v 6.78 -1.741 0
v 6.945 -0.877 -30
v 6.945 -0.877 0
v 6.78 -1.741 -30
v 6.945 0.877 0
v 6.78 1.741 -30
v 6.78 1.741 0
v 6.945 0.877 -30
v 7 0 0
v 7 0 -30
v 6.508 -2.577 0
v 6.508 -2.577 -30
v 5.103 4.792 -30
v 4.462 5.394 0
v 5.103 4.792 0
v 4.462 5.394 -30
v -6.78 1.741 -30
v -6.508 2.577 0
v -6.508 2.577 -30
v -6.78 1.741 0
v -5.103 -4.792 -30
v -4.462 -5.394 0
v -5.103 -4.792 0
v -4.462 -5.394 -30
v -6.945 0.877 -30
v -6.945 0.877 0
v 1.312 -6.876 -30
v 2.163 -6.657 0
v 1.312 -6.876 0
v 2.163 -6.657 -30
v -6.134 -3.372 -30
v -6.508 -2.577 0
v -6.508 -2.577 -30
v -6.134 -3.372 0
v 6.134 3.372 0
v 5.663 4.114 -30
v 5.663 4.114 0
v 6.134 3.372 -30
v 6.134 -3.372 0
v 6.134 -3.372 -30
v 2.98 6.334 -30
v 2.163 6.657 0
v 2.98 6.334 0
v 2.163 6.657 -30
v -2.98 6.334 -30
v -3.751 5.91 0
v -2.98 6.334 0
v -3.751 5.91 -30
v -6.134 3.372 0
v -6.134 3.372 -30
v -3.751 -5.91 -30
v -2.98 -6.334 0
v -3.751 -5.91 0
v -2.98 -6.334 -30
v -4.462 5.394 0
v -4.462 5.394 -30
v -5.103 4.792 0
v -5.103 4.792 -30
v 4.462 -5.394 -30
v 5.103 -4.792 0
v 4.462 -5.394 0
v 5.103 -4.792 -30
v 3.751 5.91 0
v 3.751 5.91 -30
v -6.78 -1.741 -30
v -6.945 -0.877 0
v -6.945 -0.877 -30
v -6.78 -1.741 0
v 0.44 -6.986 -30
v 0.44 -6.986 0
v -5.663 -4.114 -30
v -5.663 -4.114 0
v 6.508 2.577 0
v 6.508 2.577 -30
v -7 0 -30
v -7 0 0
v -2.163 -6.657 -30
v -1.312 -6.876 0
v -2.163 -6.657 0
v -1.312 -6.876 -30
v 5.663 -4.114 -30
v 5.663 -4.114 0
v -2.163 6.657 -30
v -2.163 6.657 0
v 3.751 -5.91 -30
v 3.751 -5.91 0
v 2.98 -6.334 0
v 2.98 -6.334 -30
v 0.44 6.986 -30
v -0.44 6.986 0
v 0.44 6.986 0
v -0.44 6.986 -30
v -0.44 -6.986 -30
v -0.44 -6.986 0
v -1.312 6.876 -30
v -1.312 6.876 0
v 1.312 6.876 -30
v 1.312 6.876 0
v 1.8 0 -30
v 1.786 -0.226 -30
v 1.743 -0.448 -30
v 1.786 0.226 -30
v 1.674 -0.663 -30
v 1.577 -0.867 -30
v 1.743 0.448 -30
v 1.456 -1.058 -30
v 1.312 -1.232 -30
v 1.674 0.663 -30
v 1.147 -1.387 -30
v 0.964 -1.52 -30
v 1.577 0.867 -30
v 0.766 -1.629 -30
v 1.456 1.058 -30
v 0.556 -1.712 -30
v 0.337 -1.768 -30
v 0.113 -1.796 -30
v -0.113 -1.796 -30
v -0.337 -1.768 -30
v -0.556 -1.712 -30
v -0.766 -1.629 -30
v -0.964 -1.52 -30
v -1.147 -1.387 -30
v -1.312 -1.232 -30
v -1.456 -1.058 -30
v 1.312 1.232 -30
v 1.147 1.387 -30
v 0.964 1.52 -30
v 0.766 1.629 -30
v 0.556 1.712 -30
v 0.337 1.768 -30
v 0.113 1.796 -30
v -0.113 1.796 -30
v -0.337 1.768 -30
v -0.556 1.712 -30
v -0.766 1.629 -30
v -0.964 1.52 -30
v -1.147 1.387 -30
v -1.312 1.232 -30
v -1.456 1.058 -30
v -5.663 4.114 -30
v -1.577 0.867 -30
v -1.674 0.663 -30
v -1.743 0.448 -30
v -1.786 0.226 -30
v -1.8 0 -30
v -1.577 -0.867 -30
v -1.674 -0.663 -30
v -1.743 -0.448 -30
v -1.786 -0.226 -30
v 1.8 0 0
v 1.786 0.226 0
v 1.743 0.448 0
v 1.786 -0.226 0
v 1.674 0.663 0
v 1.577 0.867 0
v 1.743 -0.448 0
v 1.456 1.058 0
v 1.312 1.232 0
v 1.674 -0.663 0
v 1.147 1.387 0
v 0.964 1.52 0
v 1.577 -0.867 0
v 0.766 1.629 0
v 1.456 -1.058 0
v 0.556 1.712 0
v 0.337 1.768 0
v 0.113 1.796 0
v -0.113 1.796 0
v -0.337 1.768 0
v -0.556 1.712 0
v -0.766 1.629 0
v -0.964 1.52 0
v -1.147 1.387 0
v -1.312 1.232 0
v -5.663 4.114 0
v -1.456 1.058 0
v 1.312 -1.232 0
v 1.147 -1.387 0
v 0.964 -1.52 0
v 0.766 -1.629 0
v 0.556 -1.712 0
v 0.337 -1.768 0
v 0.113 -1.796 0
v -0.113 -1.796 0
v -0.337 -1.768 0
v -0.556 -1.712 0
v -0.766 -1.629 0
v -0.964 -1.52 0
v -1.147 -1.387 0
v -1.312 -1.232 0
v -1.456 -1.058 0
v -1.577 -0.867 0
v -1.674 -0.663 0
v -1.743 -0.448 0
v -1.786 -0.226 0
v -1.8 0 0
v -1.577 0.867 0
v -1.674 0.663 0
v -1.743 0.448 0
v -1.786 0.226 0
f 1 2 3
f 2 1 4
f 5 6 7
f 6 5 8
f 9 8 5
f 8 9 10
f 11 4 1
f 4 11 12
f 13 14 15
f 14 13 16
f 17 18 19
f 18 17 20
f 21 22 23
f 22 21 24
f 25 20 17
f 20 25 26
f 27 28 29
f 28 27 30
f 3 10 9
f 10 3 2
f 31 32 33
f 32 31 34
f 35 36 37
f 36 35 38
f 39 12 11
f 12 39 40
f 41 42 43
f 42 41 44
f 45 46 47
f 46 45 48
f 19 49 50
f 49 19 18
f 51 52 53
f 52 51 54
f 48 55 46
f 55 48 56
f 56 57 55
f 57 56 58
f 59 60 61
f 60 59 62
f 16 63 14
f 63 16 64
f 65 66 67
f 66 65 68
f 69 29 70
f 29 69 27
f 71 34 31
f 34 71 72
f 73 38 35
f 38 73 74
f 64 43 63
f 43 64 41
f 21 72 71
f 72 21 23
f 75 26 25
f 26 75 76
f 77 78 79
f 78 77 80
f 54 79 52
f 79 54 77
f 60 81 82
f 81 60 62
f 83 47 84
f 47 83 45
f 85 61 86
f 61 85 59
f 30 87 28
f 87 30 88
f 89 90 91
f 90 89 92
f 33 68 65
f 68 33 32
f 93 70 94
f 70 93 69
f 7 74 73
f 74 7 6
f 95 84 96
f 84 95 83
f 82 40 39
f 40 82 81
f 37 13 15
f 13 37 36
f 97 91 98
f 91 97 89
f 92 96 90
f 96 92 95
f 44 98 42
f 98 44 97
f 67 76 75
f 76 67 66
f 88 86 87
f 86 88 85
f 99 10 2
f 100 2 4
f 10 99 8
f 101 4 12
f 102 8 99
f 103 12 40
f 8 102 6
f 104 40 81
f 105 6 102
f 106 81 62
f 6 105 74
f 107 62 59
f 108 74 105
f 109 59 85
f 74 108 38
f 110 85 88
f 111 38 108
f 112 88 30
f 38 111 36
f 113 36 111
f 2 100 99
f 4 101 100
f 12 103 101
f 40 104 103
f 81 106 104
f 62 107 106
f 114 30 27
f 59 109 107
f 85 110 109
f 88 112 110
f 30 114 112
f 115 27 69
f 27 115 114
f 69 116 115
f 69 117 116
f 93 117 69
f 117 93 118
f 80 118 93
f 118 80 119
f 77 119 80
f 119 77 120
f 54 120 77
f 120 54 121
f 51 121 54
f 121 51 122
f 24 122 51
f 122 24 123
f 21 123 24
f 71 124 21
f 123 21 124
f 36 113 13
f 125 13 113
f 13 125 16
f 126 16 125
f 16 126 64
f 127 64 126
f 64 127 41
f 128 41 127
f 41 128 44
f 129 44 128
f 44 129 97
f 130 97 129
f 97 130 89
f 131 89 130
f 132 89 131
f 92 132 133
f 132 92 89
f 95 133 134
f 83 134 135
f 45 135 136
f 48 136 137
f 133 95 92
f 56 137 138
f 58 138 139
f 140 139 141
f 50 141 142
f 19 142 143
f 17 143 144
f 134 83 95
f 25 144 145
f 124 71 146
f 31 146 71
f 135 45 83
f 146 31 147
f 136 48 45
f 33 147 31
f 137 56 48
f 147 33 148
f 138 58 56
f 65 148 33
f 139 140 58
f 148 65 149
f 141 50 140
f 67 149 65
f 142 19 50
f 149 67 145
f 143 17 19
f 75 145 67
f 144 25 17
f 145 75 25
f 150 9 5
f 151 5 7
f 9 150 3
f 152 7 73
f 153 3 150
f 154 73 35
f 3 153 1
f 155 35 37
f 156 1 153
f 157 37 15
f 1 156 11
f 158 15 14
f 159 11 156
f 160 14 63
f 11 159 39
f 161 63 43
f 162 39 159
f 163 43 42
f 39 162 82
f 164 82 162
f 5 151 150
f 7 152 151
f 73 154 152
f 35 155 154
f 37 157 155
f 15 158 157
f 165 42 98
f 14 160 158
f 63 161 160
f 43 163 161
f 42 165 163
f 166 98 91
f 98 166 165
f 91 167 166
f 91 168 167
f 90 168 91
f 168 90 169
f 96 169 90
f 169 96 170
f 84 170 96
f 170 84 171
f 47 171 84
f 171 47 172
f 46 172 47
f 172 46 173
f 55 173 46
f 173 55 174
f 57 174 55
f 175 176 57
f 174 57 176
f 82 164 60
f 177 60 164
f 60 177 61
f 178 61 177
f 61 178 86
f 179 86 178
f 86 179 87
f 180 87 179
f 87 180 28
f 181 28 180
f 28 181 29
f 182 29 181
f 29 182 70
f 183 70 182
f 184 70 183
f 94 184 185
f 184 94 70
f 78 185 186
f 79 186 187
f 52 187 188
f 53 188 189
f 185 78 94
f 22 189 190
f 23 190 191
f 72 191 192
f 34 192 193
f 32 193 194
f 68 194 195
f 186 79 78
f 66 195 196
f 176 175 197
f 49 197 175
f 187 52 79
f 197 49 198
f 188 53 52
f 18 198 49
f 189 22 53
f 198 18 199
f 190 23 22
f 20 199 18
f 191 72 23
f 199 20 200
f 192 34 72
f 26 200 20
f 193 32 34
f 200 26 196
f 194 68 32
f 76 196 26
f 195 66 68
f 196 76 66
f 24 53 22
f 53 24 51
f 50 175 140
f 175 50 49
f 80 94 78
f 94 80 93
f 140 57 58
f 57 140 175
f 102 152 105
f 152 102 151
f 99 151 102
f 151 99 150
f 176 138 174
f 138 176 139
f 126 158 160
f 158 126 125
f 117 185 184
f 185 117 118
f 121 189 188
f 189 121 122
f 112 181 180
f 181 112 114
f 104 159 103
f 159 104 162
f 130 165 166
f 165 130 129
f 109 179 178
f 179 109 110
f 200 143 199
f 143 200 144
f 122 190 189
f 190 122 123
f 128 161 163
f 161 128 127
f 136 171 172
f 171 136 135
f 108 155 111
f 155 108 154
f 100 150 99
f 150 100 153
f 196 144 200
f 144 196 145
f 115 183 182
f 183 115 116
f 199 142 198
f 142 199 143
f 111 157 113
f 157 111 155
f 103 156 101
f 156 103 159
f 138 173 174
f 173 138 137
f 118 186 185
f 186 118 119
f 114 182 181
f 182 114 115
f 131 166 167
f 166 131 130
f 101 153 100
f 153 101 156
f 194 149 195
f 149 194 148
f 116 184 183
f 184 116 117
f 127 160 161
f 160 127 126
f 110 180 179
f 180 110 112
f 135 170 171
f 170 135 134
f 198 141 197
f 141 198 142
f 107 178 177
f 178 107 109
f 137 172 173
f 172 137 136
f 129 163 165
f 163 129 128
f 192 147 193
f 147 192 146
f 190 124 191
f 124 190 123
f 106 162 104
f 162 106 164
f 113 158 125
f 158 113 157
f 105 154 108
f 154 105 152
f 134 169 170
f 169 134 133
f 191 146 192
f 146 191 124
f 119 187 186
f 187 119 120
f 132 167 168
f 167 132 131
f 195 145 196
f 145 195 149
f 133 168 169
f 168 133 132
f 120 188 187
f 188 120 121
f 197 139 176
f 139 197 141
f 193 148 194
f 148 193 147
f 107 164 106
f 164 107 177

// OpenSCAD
$fn = 50;


difference() {
	union() {
		translate(v = [0, 0, -30.0000000000]) {
			cylinder(h = 30, r = 7.0000000000);
		}
	}
	union() {
		#translate(v = [0, 0, -30]) {
			cylinder(h = 30, r = 1.8000000000);
		}
	}
}
